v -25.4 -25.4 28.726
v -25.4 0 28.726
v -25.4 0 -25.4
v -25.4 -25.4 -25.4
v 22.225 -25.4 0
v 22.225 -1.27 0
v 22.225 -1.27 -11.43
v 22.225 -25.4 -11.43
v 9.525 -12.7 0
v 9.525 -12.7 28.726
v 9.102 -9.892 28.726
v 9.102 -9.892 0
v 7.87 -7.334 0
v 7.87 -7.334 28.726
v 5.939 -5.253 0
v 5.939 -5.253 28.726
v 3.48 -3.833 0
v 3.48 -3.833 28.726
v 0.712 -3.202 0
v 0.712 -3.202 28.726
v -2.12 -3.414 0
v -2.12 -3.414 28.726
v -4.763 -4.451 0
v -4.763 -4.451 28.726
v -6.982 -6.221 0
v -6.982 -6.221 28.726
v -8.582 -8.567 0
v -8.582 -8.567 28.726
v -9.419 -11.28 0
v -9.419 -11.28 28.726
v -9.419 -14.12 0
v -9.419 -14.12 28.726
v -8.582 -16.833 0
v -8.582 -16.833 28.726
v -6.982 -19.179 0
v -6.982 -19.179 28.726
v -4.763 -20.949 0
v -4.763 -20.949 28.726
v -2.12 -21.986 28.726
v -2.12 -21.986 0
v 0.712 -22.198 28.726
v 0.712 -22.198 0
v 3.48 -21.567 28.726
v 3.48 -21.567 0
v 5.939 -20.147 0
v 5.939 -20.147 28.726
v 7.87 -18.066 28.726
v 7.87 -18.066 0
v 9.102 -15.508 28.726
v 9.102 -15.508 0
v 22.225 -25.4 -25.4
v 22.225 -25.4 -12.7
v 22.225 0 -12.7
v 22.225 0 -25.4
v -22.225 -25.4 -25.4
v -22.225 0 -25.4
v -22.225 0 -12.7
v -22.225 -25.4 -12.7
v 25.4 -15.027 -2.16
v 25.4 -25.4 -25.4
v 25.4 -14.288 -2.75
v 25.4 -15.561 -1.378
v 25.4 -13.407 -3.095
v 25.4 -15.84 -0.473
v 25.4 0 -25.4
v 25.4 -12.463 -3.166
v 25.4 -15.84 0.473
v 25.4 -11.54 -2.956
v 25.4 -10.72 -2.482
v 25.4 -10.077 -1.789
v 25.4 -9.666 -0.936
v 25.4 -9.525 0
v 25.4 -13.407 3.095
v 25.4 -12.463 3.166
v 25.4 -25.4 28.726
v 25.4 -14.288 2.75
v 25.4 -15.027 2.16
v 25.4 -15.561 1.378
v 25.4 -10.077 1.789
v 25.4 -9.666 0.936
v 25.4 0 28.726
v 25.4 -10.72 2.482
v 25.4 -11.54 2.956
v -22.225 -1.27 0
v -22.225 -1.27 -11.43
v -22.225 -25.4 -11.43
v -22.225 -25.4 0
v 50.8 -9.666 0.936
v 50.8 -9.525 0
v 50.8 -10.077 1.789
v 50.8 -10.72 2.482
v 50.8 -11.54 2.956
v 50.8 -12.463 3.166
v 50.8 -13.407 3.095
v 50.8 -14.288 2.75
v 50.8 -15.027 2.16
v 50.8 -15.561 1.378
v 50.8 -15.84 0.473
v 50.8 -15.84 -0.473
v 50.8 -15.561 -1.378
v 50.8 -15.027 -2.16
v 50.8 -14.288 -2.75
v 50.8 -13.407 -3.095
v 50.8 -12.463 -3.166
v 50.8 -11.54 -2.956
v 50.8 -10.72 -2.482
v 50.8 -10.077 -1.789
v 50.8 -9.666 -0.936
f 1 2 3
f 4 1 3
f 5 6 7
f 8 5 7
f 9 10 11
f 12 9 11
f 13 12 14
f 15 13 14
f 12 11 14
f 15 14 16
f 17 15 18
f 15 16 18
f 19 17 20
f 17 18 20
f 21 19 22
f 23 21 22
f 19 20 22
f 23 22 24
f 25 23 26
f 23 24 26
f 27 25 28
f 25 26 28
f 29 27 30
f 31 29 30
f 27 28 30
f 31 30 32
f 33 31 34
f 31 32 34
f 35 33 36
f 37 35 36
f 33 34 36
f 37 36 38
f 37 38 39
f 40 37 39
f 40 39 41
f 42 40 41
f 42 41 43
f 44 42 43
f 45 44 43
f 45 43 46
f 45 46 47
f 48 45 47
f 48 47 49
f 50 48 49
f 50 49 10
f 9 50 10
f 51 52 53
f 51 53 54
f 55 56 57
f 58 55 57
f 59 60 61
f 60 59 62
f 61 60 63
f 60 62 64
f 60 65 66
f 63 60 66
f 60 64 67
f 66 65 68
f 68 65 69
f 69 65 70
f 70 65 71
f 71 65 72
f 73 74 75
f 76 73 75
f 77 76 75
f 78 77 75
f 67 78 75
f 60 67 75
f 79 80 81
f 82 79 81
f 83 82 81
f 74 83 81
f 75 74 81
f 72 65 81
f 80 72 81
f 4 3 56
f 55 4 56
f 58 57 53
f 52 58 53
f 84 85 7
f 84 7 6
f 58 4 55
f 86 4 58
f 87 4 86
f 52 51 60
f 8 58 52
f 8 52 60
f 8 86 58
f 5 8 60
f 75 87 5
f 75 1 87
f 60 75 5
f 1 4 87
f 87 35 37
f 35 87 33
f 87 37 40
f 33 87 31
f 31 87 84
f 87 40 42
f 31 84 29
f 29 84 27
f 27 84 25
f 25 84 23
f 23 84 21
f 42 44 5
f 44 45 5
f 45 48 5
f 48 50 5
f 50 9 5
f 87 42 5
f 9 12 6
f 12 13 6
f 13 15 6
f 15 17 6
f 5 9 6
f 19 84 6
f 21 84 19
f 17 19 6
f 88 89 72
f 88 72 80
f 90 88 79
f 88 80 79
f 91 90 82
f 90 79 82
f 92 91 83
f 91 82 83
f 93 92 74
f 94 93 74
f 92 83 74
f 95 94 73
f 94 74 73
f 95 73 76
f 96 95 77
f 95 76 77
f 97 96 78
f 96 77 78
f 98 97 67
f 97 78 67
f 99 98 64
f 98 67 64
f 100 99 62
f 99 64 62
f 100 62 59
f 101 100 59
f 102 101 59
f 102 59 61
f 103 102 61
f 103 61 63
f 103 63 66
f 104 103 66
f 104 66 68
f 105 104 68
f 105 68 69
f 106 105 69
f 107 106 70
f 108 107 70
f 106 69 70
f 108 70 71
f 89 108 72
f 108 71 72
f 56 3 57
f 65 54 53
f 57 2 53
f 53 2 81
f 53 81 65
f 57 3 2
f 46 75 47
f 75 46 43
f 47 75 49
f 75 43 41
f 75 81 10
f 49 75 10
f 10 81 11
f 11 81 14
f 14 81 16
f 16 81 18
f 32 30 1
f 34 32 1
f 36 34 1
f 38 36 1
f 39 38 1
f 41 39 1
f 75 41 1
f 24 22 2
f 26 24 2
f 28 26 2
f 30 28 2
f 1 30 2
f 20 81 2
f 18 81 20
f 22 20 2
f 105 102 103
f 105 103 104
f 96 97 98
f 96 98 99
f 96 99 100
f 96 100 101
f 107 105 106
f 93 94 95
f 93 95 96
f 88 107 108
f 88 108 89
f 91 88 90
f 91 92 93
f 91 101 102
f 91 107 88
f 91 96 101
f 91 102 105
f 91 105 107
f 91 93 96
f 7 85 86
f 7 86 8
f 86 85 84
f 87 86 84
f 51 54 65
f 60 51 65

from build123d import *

# Parameters (mm, degrees)
F0_W     = 44.45
F0_H     = 1.27
F1_DEPTH = 25.4
F2_R     = 9.525
F3_DEPTH = 38.1
F4_W     = 1.27
F4_H     = 11.43
F5_DEPTH = 44.45
F6_R     = 3.175
F7_DEPTH = 25.4


with BuildPart() as f1:
    # F0 (on Front) → F1 (new body)
    with BuildSketch(Plane.XZ):
        Polygon((-22.225, -11.43), (-22.225, 0), (-25.4, 0), (-25.4, -25.4), (-22.225, -25.4), (-22.225, -12.7), align=None)
        Polygon((25.4, 0), (22.225, 0), (22.225, -11.43), (22.225, -12.7), (22.225, -25.4), (25.4, -25.4), align=None)
        Polygon((-22.225, 0), (0, 0), (22.225, 0), (25.4, 0), (25.4, 28.7261897342), (-25.4, 28.7261897342), (-25.4, 0), align=None)
        with Locations((0, -12.065)):
            Rectangle(F0_W, F0_H)
    extrude(amount=F1_DEPTH)

    # F2 (on face) → F3 (cut)
    with BuildSketch(Plane.XY.offset(28.7261897342)):
        with Locations((0, -12.7)):
            Circle(F2_R)
    extrude(amount=-F3_DEPTH, mode=Mode.SUBTRACT)

    # F4 (on face) → F5 (join)
    with BuildSketch(Plane.YZ.offset(-22.225)):
        with Locations((-0.635, -5.715)):
            Rectangle(F4_W, F4_H)
    extrude(amount=F5_DEPTH)

    # F6 (on face) → F7 (join)
    with BuildSketch(Plane.YZ.offset(25.4)):
        with Locations((-12.7, 0)):
            Circle(F6_R)
    extrude(amount=F7_DEPTH)


solid = f1.part
